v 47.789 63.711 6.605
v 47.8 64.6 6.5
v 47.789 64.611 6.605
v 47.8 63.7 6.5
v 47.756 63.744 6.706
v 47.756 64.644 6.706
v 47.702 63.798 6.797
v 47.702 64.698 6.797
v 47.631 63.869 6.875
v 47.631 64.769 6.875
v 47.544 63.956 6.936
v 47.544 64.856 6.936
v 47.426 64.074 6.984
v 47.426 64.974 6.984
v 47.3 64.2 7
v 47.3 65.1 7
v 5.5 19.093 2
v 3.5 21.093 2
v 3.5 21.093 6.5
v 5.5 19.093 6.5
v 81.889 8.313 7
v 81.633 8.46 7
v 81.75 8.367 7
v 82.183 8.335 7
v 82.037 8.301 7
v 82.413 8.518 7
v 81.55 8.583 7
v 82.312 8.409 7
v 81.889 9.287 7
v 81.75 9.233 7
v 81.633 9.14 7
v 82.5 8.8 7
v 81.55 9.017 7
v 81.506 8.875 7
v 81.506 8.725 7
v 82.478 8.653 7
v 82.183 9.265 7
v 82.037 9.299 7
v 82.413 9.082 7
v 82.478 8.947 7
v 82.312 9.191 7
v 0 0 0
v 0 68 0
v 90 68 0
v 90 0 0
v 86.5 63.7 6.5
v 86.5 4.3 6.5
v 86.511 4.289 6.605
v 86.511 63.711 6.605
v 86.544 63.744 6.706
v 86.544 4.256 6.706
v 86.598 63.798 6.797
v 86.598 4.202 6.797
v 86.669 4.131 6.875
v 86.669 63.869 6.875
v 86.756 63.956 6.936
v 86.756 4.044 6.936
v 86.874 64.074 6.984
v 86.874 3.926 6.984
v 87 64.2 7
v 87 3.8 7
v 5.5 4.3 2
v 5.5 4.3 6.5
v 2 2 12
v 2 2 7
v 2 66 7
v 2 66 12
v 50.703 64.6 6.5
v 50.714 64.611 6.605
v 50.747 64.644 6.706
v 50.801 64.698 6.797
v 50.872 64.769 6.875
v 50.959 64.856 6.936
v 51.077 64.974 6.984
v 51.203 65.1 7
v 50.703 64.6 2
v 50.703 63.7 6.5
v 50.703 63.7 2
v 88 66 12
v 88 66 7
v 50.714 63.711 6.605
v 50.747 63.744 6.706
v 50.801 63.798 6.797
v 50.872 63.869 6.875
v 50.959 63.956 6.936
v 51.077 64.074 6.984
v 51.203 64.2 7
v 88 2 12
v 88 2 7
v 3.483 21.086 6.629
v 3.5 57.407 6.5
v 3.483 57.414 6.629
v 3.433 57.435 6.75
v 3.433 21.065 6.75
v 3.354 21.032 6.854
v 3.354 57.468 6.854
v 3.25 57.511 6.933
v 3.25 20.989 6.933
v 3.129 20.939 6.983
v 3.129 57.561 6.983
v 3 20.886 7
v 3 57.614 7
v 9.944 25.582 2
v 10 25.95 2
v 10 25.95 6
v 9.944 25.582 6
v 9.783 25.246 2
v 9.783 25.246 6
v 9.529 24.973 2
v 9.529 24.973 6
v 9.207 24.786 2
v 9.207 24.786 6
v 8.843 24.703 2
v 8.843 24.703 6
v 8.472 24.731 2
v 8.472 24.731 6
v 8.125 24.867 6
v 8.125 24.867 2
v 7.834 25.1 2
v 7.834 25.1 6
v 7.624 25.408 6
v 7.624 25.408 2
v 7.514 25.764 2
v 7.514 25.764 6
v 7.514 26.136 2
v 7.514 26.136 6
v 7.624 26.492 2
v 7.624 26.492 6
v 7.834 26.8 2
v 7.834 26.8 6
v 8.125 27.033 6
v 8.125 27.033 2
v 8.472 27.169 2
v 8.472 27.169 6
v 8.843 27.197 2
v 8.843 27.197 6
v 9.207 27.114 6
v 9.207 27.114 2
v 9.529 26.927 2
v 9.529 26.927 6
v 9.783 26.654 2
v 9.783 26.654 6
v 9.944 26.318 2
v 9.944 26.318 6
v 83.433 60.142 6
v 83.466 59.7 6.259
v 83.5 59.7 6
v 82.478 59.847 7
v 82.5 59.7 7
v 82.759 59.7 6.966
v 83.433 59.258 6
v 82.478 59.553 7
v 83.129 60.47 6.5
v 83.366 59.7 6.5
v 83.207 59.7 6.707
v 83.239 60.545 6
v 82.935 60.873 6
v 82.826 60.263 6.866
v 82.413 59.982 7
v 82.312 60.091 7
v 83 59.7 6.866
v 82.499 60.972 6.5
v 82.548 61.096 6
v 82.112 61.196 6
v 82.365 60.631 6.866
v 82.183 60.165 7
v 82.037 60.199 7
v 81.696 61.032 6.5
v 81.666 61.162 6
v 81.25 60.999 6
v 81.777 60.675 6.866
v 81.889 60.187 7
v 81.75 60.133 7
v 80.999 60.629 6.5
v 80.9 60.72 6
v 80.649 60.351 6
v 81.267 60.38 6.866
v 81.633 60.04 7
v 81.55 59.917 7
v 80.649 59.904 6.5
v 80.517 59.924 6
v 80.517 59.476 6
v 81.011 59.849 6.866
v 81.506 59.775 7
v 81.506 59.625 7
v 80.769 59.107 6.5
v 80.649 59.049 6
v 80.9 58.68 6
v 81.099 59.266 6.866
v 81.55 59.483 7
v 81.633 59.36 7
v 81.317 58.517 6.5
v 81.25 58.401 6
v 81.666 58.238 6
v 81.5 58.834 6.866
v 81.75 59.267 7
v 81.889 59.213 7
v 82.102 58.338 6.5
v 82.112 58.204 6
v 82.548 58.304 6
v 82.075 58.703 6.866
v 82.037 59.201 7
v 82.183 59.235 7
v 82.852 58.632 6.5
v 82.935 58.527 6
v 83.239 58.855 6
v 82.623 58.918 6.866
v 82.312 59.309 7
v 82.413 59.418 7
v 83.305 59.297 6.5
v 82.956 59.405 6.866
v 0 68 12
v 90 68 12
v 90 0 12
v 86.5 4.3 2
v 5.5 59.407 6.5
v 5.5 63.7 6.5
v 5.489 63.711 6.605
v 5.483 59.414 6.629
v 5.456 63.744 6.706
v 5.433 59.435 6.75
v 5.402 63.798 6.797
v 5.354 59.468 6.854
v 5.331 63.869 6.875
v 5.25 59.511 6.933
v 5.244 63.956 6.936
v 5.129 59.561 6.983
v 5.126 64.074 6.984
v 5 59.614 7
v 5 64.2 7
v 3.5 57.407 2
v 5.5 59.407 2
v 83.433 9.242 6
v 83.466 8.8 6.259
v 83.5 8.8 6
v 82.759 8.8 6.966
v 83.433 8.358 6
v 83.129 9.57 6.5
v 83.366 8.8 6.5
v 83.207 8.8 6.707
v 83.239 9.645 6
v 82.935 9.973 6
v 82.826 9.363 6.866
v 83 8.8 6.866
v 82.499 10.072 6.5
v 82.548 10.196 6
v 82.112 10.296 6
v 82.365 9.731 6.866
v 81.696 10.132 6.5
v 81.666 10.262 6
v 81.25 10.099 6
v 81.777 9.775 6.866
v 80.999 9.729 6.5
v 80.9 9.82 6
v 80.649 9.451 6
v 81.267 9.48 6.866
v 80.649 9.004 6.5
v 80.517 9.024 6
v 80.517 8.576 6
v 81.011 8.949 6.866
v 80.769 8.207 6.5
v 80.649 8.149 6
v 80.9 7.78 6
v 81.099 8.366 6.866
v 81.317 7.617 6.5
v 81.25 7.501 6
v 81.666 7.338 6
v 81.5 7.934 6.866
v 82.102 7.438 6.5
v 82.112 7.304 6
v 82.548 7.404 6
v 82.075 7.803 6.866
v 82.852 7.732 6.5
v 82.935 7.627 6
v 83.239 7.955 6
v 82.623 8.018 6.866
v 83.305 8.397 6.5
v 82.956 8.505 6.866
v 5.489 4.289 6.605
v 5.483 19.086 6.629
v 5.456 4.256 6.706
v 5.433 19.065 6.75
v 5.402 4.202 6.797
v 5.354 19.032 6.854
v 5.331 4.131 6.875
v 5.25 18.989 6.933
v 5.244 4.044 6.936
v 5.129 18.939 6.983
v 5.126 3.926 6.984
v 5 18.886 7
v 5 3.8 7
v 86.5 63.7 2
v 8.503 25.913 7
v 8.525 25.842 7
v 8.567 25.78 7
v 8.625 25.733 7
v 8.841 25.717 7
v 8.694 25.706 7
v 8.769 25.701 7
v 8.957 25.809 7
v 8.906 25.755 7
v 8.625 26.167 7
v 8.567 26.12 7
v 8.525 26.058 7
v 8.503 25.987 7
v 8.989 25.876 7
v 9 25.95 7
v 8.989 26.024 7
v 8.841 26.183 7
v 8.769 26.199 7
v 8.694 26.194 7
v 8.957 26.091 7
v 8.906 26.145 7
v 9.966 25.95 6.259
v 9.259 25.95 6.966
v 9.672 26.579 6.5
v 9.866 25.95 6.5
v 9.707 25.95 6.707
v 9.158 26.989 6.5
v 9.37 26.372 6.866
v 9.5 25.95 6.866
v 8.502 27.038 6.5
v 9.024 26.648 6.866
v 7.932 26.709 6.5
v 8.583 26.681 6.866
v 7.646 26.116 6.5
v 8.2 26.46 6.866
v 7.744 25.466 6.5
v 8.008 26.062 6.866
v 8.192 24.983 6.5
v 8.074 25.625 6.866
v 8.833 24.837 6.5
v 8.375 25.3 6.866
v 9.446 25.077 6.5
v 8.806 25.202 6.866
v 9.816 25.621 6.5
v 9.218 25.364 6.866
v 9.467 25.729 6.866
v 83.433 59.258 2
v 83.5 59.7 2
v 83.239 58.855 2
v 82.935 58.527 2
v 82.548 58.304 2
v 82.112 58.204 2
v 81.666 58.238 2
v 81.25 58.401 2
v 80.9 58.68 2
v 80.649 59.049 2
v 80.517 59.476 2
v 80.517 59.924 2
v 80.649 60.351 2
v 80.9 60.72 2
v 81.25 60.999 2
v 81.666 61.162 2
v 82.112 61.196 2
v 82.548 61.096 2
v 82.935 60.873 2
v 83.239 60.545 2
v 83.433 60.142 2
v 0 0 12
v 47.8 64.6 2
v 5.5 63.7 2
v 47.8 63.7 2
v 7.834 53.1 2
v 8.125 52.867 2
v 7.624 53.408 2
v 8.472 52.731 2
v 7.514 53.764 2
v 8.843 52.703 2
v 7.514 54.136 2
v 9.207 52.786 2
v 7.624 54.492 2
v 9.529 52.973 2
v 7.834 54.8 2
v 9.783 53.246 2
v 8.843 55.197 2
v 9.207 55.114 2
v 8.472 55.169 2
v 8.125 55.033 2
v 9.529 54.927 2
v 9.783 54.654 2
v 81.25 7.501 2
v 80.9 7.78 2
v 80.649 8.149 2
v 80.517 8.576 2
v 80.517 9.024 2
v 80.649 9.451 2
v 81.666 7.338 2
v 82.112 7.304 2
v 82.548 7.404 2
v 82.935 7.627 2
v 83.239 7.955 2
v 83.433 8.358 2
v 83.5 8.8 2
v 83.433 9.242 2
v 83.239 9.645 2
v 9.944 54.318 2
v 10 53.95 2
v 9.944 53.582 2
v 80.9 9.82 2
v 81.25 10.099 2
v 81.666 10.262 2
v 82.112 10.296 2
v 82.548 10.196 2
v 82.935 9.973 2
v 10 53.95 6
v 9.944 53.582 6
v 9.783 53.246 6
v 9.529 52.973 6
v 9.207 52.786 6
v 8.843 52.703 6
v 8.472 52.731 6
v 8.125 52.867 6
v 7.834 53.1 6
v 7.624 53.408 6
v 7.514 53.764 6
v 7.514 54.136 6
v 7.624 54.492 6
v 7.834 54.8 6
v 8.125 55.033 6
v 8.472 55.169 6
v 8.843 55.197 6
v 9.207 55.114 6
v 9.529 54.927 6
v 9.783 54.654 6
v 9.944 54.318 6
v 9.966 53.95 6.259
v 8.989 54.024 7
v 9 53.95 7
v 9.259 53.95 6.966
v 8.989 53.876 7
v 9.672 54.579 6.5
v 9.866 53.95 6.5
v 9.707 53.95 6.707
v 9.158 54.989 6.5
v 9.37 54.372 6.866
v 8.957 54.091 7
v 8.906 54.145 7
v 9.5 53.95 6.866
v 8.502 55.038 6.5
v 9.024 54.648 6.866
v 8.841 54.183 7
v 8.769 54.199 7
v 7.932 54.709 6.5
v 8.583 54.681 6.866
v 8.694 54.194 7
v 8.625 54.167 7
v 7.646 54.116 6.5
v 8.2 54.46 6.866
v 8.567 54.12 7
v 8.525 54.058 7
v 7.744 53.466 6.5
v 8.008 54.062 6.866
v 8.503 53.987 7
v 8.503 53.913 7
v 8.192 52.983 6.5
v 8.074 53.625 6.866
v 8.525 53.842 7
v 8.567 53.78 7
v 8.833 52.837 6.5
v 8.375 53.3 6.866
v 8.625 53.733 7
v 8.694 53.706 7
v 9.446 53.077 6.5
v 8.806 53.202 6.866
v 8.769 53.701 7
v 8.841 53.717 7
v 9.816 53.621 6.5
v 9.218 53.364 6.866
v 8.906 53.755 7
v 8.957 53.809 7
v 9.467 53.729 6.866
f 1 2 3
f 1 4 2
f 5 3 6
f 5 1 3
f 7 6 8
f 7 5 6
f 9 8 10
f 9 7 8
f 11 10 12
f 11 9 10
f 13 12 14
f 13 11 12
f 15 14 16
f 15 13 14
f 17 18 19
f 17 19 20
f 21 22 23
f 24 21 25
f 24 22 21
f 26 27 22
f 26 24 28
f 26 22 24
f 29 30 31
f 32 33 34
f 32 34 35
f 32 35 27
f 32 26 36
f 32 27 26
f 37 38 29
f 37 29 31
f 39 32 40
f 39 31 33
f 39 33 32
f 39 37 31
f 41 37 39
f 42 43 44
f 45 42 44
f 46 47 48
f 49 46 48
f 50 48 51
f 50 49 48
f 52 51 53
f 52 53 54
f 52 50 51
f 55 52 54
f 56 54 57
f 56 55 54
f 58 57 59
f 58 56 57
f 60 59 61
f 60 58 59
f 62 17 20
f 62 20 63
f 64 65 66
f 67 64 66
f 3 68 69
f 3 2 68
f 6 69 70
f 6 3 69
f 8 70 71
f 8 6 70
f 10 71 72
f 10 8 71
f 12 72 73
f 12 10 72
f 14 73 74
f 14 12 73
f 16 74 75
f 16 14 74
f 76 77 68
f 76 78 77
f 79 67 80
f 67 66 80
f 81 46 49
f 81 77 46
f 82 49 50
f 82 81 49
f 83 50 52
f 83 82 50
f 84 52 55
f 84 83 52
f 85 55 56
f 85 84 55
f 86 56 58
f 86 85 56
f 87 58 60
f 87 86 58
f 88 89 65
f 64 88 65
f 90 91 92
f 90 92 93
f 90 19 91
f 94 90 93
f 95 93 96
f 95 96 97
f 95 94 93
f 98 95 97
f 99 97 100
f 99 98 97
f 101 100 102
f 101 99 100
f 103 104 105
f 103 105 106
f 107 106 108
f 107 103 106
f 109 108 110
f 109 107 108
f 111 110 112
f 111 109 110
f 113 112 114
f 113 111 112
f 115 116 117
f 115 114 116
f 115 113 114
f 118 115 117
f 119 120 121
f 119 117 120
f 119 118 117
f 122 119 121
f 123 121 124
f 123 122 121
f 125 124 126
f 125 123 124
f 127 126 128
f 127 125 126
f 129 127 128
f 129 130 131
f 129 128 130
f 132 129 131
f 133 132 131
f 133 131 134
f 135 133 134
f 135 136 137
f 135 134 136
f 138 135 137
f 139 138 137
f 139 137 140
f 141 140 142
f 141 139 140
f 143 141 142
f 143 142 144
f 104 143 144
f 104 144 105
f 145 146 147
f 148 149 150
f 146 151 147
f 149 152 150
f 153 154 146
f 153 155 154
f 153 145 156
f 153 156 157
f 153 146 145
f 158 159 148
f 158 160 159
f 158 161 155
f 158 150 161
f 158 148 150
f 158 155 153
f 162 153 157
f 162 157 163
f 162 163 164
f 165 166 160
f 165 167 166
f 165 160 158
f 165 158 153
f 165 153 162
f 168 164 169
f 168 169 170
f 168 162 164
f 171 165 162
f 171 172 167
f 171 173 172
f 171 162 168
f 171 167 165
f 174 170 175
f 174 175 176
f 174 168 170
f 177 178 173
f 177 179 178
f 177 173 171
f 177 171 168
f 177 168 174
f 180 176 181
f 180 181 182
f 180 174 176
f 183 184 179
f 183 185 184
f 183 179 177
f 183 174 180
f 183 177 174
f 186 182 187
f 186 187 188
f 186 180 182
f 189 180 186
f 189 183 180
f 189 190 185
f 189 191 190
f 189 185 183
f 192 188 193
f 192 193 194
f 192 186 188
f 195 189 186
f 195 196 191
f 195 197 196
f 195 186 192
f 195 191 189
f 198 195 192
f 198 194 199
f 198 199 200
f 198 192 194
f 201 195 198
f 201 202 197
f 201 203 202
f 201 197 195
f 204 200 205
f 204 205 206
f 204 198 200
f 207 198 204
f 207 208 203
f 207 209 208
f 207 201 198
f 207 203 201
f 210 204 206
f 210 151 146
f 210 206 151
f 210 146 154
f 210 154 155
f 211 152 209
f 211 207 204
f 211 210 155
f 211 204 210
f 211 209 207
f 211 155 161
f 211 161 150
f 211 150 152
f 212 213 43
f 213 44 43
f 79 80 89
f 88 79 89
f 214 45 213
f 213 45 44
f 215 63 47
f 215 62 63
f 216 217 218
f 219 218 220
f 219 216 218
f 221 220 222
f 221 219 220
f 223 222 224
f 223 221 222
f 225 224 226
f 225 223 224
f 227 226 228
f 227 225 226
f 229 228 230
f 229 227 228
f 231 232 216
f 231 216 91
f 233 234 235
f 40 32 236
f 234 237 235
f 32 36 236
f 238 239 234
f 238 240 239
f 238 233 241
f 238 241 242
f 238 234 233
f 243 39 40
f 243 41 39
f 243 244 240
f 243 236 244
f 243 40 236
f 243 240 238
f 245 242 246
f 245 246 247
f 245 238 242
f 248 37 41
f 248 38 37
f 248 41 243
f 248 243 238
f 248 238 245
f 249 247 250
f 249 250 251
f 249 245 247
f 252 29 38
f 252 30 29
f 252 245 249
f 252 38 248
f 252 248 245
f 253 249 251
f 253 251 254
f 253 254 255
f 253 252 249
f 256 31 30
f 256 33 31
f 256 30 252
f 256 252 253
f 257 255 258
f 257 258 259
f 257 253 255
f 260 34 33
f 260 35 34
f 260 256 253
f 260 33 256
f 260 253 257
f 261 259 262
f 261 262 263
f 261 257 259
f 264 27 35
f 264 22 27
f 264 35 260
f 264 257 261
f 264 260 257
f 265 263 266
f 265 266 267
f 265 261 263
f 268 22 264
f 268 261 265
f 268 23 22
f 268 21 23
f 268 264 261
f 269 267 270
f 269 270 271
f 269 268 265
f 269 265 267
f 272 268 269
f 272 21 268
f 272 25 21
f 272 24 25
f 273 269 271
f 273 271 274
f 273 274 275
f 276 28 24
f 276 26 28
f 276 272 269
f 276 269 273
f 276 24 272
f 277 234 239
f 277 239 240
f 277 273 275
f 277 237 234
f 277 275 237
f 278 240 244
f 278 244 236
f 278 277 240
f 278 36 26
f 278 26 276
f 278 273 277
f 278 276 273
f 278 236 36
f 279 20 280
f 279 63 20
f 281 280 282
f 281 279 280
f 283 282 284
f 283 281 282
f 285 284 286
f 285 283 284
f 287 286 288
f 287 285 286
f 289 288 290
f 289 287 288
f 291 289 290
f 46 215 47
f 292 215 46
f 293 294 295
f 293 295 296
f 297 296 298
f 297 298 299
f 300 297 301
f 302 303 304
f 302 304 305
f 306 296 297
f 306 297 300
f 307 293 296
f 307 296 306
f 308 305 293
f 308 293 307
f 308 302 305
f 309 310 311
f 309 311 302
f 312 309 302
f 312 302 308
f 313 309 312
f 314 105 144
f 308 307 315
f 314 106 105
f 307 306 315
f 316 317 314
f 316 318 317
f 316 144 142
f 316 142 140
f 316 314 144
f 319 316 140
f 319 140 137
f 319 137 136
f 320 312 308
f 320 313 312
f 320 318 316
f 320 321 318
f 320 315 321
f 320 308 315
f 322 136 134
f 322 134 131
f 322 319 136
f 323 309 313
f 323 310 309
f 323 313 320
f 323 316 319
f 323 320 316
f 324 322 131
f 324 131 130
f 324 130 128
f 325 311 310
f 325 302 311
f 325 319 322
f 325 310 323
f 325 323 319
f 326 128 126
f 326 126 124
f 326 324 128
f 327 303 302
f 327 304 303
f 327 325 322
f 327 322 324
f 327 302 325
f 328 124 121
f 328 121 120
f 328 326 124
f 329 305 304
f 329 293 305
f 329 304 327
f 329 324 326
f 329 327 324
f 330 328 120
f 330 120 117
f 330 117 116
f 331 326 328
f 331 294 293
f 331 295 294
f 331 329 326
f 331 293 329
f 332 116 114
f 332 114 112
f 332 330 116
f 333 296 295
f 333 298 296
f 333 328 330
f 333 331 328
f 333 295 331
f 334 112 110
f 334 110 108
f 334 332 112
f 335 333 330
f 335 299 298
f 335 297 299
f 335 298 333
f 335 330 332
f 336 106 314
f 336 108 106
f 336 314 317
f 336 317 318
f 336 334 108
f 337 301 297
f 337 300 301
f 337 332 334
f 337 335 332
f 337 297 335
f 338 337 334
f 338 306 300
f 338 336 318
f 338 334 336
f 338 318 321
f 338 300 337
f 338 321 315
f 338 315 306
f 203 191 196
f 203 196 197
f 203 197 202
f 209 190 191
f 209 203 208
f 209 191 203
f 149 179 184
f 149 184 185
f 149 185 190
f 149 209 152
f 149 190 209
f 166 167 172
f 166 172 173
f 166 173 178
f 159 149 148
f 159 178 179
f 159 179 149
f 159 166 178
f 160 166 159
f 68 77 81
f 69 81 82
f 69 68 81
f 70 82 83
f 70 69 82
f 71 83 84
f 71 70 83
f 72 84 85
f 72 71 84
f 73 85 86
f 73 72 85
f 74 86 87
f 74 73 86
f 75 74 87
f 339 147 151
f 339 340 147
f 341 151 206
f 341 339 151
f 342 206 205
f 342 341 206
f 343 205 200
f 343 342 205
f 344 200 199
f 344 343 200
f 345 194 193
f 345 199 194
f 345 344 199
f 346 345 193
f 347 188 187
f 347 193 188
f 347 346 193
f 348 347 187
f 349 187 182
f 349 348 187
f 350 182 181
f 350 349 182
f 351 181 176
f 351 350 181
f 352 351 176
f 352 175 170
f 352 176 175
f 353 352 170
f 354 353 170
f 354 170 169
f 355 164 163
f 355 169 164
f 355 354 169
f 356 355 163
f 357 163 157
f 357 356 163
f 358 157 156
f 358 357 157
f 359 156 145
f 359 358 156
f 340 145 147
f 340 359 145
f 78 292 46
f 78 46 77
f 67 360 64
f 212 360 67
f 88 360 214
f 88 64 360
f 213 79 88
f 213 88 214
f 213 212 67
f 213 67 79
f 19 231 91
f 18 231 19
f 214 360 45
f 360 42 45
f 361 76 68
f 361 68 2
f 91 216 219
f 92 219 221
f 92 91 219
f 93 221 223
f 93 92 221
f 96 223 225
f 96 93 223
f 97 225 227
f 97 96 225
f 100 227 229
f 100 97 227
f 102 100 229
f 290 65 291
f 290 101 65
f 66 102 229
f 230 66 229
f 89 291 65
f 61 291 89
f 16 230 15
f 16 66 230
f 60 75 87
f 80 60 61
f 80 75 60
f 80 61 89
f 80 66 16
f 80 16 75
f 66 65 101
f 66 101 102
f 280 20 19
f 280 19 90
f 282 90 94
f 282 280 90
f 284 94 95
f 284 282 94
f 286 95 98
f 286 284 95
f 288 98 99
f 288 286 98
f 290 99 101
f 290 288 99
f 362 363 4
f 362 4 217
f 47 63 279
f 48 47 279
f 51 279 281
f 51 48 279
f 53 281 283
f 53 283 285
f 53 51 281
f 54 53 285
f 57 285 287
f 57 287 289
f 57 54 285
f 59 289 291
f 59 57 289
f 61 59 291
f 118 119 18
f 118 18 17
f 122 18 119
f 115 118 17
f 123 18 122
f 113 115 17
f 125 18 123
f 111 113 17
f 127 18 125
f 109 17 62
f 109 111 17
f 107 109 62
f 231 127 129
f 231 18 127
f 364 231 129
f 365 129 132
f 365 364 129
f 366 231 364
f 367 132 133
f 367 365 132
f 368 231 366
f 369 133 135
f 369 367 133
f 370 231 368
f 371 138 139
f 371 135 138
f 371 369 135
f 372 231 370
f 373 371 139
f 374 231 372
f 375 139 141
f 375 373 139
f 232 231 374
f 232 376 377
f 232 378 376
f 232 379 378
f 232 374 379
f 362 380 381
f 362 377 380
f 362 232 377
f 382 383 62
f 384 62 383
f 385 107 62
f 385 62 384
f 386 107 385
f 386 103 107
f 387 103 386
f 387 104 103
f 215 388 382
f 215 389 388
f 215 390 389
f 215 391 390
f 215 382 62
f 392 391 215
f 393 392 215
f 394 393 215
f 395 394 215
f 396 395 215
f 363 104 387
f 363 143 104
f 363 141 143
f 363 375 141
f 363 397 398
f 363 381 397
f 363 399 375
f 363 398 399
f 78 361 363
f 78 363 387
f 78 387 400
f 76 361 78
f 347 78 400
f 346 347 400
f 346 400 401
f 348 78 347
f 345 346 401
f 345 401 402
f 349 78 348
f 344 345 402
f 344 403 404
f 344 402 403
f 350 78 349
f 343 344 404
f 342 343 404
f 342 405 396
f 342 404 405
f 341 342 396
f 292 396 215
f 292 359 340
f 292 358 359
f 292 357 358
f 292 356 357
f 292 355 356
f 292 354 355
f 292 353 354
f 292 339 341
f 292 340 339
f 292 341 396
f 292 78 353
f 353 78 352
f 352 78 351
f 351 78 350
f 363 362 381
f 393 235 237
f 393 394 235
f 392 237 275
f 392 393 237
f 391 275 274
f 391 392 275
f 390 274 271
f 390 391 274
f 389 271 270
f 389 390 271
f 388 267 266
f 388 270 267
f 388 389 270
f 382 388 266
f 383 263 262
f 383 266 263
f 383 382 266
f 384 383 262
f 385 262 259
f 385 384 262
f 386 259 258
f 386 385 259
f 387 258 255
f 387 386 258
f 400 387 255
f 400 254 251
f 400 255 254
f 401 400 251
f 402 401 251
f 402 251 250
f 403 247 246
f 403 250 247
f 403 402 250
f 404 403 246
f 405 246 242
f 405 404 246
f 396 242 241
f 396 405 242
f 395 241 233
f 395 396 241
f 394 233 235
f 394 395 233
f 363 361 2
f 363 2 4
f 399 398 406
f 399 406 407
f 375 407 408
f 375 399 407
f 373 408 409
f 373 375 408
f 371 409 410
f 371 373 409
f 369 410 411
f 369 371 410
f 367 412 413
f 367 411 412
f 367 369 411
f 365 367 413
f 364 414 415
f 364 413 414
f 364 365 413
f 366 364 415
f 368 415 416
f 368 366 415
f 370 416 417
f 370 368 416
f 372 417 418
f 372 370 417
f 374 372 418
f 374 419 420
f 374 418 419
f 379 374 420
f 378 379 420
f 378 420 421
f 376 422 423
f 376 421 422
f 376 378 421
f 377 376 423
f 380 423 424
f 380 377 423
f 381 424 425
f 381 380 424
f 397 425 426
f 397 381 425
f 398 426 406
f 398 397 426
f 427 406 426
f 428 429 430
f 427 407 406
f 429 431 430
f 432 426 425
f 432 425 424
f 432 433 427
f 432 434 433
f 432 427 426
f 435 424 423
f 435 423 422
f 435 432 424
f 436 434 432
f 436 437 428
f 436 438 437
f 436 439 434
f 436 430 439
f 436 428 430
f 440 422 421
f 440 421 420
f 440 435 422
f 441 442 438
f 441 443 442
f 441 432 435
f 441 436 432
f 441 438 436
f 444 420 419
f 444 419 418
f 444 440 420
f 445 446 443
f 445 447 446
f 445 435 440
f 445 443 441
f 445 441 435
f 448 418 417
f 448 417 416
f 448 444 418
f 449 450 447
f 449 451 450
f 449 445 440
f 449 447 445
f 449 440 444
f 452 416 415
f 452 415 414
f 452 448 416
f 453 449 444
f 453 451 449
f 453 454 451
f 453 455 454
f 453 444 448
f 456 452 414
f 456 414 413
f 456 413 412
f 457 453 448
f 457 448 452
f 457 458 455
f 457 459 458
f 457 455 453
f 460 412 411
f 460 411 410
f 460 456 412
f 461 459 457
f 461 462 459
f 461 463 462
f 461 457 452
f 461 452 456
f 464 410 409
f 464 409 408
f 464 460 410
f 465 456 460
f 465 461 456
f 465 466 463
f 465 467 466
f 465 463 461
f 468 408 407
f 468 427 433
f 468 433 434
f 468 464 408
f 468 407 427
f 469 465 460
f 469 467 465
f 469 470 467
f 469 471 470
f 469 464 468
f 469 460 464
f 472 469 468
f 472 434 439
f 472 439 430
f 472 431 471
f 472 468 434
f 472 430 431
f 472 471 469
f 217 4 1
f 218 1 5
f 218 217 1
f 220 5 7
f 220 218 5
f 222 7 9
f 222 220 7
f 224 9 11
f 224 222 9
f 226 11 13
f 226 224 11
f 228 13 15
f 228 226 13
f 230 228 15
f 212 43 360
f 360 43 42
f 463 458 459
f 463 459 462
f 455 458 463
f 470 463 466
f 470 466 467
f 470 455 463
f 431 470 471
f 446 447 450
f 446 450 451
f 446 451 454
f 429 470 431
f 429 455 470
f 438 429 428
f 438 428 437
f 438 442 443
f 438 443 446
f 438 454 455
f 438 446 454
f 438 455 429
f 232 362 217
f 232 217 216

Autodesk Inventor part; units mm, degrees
ref_plane "YZ Plane" through (0, 0, 0) normal (1, 0, 0) x (0, 1, 0)
ref_plane "XZ Plane" through (0, 0, 0) normal (0, 1, 0) x (-1, 0, 0)
ref_plane "XY Plane" through (0, 0, 0) normal (0, 0, 1) x (1, 0, 0)
sketch "Sketch1" plane through (0, 0, 0) normal (0, 0, 1) x (1, 0, 0)
  line L0 (0, 0) -> (90, 0)
  line L1 (90, 0) -> (90, 68)
  line L2 (90, 68) -> (0, 68)
  line L3 (0, 68) -> (0, 0)
  dimension "d0" = 90
  dimension "d1" = 68
extrude "Extrusion1" add sketch "Sketch1" along normal blind 2
sketch "Sketch2" plane through (0, 0, 2) normal (0, 0, 1) x (1, 0, 0)
  line L0 (90, 68) -> (0, 68) projected
  line L1 (0, 68) -> (90, 68)
  line L2 (90, 68) -> (90, 0)
  line L3 (90, 0) -> (0, 0)
  line L4 (0, 0) -> (0, 68)
  line L5 (2, 66) -> (88, 66)
  line L6 (88, 66) -> (88, 2)
  line L7 (88, 2) -> (2, 2)
  line L8 (2, 2) -> (2, 66)
  dimension "d4" = 2
  dimension "d5" = 2
  dimension "d6" = 2
  dimension "d7" = 2
extrude "Extrusion2" add sketch "Sketch2" along normal blind 10
sketch "Sketch3" plane through (0, 0, 2) normal (0, 0, 1) x (1, 0, 0)
  line L0 (6, 63.2) -> (86, 63.2)
  line L1 (86, 63.2) -> (86, 4.8)
  line L2 (86, 4.8) -> (6, 4.8)
  line L3 (4, 21.3) -> (4, 57.2)
  line L4 (2, 66) -> (88, 66) projected
  line L5 (0, 0) -> (90, 0) projected
  line L6 (90, 68) -> (0, 68) projected
  line L7 (88, 2) -> (2, 2) projected
  line L8 (2, 2) -> (2, 66) projected
  line L9 (88, 66) -> (88, 2) projected
  line L10 (47.8, 63.2) -> (50.703, 63.2)
  line L11 (50.703, 63.2) -> (50.703, 64.6)
  line L12 (50.703, 64.6) -> (47.8, 64.6)
  line L13 (47.8, 64.6) -> (47.8, 63.2)
  circle A0 centre (82, 59.7) radius 1.5
  line L14 (4, 57.2) -> (6, 59.2)
  line L15 (4, 57.2) -> (6.8284, 57.2) construction
  line L16 (6, 59.2) -> (6, 63.2)
  line L17 (4, 21.3) -> (6, 19.3)
  line L18 (4, 21.3) -> (6.8284, 21.3) construction
  line L19 (6, 19.3) -> (6, 4.8)
  circle A1 centre (8.75, 53.95) radius 1.25
  circle A2 centre (8.75, 25.95) radius 1.25
  line L20 (86.5, 63.7) -> (5.5, 63.7)
  line L21 (5.5, 63.7) -> (5.5, 59.4071)
  line L22 (5.5, 59.4071) -> (3.5, 57.4071)
  line L23 (3.5, 57.4071) -> (3.5, 21.0929)
  line L24 (3.5, 21.0929) -> (5.5, 19.0929)
  line L25 (5.5, 19.0929) -> (5.5, 4.3)
  line L26 (5.5, 4.3) -> (86.5, 4.3)
  line L27 (86.5, 4.3) -> (86.5, 63.7)
  circle A3 centre (82, 8.8) radius 1.5
  dimension "d11" = 58.4
  dimension "d12" = 2.8
  dimension "d14" = 64
  dimension "d18" = 2
  dimension "d19" = 86
  dimension "d20" = 38.2
  dimension "d21" = 1.4
  dimension "d22" = 3
  dimension "d23" = 3.5
  dimension "d24" = 4
  dimension "d25" = 45
  dimension "d26" = 4
  dimension "d28" = 45
  dimension "d30" = 2
  dimension "d31" = 2
  dimension "d32" = 82
  dimension "d33" = 2.5
  dimension "d34" = 4.75
  dimension "d36" = 2.5
  dimension "d38" = 25.5
  dimension "d39" = 8
  dimension "d40" = 14.5
  dimension "d41" = 39.9
  dimension "d42" = 0.5
  dimension "d45" = 3
  dimension "d47" = 2.5
extrude "Extrusion3" add sketch "Sketch3" along normal blind 5
fillet "Fillet1" radius 1 4 edges at (7.5, 53.95, 7) (7.5, 25.95, 7) (80.5, 59.7, 7) (80.5, 8.8, 7)
fillet "Fillet2" radius 0.5 12 edges at (26.65, 63.7, 7) (5.5, 61.5536, 7) (4.5, 58.4071, 7) (3.5, 39.25, 7) (4.5, 20.0929, 7) (5.5, 11.6964, 7) (46, 4.3, 7) (86.5, 34, 7) (68.6015, 63.7, 7) (49.2515, 64.6, 7) (50.703, 64.15, 7) (47.8, 64.15, 7)
equation "\"d12\" = -0.5 * d11 + 0.5 * d14"
equation "\"d18\" = -0.5 * d10 + 0.5 * d19"
equation "\"d10\" = 82"
properties part number "Lådaprototyp"
